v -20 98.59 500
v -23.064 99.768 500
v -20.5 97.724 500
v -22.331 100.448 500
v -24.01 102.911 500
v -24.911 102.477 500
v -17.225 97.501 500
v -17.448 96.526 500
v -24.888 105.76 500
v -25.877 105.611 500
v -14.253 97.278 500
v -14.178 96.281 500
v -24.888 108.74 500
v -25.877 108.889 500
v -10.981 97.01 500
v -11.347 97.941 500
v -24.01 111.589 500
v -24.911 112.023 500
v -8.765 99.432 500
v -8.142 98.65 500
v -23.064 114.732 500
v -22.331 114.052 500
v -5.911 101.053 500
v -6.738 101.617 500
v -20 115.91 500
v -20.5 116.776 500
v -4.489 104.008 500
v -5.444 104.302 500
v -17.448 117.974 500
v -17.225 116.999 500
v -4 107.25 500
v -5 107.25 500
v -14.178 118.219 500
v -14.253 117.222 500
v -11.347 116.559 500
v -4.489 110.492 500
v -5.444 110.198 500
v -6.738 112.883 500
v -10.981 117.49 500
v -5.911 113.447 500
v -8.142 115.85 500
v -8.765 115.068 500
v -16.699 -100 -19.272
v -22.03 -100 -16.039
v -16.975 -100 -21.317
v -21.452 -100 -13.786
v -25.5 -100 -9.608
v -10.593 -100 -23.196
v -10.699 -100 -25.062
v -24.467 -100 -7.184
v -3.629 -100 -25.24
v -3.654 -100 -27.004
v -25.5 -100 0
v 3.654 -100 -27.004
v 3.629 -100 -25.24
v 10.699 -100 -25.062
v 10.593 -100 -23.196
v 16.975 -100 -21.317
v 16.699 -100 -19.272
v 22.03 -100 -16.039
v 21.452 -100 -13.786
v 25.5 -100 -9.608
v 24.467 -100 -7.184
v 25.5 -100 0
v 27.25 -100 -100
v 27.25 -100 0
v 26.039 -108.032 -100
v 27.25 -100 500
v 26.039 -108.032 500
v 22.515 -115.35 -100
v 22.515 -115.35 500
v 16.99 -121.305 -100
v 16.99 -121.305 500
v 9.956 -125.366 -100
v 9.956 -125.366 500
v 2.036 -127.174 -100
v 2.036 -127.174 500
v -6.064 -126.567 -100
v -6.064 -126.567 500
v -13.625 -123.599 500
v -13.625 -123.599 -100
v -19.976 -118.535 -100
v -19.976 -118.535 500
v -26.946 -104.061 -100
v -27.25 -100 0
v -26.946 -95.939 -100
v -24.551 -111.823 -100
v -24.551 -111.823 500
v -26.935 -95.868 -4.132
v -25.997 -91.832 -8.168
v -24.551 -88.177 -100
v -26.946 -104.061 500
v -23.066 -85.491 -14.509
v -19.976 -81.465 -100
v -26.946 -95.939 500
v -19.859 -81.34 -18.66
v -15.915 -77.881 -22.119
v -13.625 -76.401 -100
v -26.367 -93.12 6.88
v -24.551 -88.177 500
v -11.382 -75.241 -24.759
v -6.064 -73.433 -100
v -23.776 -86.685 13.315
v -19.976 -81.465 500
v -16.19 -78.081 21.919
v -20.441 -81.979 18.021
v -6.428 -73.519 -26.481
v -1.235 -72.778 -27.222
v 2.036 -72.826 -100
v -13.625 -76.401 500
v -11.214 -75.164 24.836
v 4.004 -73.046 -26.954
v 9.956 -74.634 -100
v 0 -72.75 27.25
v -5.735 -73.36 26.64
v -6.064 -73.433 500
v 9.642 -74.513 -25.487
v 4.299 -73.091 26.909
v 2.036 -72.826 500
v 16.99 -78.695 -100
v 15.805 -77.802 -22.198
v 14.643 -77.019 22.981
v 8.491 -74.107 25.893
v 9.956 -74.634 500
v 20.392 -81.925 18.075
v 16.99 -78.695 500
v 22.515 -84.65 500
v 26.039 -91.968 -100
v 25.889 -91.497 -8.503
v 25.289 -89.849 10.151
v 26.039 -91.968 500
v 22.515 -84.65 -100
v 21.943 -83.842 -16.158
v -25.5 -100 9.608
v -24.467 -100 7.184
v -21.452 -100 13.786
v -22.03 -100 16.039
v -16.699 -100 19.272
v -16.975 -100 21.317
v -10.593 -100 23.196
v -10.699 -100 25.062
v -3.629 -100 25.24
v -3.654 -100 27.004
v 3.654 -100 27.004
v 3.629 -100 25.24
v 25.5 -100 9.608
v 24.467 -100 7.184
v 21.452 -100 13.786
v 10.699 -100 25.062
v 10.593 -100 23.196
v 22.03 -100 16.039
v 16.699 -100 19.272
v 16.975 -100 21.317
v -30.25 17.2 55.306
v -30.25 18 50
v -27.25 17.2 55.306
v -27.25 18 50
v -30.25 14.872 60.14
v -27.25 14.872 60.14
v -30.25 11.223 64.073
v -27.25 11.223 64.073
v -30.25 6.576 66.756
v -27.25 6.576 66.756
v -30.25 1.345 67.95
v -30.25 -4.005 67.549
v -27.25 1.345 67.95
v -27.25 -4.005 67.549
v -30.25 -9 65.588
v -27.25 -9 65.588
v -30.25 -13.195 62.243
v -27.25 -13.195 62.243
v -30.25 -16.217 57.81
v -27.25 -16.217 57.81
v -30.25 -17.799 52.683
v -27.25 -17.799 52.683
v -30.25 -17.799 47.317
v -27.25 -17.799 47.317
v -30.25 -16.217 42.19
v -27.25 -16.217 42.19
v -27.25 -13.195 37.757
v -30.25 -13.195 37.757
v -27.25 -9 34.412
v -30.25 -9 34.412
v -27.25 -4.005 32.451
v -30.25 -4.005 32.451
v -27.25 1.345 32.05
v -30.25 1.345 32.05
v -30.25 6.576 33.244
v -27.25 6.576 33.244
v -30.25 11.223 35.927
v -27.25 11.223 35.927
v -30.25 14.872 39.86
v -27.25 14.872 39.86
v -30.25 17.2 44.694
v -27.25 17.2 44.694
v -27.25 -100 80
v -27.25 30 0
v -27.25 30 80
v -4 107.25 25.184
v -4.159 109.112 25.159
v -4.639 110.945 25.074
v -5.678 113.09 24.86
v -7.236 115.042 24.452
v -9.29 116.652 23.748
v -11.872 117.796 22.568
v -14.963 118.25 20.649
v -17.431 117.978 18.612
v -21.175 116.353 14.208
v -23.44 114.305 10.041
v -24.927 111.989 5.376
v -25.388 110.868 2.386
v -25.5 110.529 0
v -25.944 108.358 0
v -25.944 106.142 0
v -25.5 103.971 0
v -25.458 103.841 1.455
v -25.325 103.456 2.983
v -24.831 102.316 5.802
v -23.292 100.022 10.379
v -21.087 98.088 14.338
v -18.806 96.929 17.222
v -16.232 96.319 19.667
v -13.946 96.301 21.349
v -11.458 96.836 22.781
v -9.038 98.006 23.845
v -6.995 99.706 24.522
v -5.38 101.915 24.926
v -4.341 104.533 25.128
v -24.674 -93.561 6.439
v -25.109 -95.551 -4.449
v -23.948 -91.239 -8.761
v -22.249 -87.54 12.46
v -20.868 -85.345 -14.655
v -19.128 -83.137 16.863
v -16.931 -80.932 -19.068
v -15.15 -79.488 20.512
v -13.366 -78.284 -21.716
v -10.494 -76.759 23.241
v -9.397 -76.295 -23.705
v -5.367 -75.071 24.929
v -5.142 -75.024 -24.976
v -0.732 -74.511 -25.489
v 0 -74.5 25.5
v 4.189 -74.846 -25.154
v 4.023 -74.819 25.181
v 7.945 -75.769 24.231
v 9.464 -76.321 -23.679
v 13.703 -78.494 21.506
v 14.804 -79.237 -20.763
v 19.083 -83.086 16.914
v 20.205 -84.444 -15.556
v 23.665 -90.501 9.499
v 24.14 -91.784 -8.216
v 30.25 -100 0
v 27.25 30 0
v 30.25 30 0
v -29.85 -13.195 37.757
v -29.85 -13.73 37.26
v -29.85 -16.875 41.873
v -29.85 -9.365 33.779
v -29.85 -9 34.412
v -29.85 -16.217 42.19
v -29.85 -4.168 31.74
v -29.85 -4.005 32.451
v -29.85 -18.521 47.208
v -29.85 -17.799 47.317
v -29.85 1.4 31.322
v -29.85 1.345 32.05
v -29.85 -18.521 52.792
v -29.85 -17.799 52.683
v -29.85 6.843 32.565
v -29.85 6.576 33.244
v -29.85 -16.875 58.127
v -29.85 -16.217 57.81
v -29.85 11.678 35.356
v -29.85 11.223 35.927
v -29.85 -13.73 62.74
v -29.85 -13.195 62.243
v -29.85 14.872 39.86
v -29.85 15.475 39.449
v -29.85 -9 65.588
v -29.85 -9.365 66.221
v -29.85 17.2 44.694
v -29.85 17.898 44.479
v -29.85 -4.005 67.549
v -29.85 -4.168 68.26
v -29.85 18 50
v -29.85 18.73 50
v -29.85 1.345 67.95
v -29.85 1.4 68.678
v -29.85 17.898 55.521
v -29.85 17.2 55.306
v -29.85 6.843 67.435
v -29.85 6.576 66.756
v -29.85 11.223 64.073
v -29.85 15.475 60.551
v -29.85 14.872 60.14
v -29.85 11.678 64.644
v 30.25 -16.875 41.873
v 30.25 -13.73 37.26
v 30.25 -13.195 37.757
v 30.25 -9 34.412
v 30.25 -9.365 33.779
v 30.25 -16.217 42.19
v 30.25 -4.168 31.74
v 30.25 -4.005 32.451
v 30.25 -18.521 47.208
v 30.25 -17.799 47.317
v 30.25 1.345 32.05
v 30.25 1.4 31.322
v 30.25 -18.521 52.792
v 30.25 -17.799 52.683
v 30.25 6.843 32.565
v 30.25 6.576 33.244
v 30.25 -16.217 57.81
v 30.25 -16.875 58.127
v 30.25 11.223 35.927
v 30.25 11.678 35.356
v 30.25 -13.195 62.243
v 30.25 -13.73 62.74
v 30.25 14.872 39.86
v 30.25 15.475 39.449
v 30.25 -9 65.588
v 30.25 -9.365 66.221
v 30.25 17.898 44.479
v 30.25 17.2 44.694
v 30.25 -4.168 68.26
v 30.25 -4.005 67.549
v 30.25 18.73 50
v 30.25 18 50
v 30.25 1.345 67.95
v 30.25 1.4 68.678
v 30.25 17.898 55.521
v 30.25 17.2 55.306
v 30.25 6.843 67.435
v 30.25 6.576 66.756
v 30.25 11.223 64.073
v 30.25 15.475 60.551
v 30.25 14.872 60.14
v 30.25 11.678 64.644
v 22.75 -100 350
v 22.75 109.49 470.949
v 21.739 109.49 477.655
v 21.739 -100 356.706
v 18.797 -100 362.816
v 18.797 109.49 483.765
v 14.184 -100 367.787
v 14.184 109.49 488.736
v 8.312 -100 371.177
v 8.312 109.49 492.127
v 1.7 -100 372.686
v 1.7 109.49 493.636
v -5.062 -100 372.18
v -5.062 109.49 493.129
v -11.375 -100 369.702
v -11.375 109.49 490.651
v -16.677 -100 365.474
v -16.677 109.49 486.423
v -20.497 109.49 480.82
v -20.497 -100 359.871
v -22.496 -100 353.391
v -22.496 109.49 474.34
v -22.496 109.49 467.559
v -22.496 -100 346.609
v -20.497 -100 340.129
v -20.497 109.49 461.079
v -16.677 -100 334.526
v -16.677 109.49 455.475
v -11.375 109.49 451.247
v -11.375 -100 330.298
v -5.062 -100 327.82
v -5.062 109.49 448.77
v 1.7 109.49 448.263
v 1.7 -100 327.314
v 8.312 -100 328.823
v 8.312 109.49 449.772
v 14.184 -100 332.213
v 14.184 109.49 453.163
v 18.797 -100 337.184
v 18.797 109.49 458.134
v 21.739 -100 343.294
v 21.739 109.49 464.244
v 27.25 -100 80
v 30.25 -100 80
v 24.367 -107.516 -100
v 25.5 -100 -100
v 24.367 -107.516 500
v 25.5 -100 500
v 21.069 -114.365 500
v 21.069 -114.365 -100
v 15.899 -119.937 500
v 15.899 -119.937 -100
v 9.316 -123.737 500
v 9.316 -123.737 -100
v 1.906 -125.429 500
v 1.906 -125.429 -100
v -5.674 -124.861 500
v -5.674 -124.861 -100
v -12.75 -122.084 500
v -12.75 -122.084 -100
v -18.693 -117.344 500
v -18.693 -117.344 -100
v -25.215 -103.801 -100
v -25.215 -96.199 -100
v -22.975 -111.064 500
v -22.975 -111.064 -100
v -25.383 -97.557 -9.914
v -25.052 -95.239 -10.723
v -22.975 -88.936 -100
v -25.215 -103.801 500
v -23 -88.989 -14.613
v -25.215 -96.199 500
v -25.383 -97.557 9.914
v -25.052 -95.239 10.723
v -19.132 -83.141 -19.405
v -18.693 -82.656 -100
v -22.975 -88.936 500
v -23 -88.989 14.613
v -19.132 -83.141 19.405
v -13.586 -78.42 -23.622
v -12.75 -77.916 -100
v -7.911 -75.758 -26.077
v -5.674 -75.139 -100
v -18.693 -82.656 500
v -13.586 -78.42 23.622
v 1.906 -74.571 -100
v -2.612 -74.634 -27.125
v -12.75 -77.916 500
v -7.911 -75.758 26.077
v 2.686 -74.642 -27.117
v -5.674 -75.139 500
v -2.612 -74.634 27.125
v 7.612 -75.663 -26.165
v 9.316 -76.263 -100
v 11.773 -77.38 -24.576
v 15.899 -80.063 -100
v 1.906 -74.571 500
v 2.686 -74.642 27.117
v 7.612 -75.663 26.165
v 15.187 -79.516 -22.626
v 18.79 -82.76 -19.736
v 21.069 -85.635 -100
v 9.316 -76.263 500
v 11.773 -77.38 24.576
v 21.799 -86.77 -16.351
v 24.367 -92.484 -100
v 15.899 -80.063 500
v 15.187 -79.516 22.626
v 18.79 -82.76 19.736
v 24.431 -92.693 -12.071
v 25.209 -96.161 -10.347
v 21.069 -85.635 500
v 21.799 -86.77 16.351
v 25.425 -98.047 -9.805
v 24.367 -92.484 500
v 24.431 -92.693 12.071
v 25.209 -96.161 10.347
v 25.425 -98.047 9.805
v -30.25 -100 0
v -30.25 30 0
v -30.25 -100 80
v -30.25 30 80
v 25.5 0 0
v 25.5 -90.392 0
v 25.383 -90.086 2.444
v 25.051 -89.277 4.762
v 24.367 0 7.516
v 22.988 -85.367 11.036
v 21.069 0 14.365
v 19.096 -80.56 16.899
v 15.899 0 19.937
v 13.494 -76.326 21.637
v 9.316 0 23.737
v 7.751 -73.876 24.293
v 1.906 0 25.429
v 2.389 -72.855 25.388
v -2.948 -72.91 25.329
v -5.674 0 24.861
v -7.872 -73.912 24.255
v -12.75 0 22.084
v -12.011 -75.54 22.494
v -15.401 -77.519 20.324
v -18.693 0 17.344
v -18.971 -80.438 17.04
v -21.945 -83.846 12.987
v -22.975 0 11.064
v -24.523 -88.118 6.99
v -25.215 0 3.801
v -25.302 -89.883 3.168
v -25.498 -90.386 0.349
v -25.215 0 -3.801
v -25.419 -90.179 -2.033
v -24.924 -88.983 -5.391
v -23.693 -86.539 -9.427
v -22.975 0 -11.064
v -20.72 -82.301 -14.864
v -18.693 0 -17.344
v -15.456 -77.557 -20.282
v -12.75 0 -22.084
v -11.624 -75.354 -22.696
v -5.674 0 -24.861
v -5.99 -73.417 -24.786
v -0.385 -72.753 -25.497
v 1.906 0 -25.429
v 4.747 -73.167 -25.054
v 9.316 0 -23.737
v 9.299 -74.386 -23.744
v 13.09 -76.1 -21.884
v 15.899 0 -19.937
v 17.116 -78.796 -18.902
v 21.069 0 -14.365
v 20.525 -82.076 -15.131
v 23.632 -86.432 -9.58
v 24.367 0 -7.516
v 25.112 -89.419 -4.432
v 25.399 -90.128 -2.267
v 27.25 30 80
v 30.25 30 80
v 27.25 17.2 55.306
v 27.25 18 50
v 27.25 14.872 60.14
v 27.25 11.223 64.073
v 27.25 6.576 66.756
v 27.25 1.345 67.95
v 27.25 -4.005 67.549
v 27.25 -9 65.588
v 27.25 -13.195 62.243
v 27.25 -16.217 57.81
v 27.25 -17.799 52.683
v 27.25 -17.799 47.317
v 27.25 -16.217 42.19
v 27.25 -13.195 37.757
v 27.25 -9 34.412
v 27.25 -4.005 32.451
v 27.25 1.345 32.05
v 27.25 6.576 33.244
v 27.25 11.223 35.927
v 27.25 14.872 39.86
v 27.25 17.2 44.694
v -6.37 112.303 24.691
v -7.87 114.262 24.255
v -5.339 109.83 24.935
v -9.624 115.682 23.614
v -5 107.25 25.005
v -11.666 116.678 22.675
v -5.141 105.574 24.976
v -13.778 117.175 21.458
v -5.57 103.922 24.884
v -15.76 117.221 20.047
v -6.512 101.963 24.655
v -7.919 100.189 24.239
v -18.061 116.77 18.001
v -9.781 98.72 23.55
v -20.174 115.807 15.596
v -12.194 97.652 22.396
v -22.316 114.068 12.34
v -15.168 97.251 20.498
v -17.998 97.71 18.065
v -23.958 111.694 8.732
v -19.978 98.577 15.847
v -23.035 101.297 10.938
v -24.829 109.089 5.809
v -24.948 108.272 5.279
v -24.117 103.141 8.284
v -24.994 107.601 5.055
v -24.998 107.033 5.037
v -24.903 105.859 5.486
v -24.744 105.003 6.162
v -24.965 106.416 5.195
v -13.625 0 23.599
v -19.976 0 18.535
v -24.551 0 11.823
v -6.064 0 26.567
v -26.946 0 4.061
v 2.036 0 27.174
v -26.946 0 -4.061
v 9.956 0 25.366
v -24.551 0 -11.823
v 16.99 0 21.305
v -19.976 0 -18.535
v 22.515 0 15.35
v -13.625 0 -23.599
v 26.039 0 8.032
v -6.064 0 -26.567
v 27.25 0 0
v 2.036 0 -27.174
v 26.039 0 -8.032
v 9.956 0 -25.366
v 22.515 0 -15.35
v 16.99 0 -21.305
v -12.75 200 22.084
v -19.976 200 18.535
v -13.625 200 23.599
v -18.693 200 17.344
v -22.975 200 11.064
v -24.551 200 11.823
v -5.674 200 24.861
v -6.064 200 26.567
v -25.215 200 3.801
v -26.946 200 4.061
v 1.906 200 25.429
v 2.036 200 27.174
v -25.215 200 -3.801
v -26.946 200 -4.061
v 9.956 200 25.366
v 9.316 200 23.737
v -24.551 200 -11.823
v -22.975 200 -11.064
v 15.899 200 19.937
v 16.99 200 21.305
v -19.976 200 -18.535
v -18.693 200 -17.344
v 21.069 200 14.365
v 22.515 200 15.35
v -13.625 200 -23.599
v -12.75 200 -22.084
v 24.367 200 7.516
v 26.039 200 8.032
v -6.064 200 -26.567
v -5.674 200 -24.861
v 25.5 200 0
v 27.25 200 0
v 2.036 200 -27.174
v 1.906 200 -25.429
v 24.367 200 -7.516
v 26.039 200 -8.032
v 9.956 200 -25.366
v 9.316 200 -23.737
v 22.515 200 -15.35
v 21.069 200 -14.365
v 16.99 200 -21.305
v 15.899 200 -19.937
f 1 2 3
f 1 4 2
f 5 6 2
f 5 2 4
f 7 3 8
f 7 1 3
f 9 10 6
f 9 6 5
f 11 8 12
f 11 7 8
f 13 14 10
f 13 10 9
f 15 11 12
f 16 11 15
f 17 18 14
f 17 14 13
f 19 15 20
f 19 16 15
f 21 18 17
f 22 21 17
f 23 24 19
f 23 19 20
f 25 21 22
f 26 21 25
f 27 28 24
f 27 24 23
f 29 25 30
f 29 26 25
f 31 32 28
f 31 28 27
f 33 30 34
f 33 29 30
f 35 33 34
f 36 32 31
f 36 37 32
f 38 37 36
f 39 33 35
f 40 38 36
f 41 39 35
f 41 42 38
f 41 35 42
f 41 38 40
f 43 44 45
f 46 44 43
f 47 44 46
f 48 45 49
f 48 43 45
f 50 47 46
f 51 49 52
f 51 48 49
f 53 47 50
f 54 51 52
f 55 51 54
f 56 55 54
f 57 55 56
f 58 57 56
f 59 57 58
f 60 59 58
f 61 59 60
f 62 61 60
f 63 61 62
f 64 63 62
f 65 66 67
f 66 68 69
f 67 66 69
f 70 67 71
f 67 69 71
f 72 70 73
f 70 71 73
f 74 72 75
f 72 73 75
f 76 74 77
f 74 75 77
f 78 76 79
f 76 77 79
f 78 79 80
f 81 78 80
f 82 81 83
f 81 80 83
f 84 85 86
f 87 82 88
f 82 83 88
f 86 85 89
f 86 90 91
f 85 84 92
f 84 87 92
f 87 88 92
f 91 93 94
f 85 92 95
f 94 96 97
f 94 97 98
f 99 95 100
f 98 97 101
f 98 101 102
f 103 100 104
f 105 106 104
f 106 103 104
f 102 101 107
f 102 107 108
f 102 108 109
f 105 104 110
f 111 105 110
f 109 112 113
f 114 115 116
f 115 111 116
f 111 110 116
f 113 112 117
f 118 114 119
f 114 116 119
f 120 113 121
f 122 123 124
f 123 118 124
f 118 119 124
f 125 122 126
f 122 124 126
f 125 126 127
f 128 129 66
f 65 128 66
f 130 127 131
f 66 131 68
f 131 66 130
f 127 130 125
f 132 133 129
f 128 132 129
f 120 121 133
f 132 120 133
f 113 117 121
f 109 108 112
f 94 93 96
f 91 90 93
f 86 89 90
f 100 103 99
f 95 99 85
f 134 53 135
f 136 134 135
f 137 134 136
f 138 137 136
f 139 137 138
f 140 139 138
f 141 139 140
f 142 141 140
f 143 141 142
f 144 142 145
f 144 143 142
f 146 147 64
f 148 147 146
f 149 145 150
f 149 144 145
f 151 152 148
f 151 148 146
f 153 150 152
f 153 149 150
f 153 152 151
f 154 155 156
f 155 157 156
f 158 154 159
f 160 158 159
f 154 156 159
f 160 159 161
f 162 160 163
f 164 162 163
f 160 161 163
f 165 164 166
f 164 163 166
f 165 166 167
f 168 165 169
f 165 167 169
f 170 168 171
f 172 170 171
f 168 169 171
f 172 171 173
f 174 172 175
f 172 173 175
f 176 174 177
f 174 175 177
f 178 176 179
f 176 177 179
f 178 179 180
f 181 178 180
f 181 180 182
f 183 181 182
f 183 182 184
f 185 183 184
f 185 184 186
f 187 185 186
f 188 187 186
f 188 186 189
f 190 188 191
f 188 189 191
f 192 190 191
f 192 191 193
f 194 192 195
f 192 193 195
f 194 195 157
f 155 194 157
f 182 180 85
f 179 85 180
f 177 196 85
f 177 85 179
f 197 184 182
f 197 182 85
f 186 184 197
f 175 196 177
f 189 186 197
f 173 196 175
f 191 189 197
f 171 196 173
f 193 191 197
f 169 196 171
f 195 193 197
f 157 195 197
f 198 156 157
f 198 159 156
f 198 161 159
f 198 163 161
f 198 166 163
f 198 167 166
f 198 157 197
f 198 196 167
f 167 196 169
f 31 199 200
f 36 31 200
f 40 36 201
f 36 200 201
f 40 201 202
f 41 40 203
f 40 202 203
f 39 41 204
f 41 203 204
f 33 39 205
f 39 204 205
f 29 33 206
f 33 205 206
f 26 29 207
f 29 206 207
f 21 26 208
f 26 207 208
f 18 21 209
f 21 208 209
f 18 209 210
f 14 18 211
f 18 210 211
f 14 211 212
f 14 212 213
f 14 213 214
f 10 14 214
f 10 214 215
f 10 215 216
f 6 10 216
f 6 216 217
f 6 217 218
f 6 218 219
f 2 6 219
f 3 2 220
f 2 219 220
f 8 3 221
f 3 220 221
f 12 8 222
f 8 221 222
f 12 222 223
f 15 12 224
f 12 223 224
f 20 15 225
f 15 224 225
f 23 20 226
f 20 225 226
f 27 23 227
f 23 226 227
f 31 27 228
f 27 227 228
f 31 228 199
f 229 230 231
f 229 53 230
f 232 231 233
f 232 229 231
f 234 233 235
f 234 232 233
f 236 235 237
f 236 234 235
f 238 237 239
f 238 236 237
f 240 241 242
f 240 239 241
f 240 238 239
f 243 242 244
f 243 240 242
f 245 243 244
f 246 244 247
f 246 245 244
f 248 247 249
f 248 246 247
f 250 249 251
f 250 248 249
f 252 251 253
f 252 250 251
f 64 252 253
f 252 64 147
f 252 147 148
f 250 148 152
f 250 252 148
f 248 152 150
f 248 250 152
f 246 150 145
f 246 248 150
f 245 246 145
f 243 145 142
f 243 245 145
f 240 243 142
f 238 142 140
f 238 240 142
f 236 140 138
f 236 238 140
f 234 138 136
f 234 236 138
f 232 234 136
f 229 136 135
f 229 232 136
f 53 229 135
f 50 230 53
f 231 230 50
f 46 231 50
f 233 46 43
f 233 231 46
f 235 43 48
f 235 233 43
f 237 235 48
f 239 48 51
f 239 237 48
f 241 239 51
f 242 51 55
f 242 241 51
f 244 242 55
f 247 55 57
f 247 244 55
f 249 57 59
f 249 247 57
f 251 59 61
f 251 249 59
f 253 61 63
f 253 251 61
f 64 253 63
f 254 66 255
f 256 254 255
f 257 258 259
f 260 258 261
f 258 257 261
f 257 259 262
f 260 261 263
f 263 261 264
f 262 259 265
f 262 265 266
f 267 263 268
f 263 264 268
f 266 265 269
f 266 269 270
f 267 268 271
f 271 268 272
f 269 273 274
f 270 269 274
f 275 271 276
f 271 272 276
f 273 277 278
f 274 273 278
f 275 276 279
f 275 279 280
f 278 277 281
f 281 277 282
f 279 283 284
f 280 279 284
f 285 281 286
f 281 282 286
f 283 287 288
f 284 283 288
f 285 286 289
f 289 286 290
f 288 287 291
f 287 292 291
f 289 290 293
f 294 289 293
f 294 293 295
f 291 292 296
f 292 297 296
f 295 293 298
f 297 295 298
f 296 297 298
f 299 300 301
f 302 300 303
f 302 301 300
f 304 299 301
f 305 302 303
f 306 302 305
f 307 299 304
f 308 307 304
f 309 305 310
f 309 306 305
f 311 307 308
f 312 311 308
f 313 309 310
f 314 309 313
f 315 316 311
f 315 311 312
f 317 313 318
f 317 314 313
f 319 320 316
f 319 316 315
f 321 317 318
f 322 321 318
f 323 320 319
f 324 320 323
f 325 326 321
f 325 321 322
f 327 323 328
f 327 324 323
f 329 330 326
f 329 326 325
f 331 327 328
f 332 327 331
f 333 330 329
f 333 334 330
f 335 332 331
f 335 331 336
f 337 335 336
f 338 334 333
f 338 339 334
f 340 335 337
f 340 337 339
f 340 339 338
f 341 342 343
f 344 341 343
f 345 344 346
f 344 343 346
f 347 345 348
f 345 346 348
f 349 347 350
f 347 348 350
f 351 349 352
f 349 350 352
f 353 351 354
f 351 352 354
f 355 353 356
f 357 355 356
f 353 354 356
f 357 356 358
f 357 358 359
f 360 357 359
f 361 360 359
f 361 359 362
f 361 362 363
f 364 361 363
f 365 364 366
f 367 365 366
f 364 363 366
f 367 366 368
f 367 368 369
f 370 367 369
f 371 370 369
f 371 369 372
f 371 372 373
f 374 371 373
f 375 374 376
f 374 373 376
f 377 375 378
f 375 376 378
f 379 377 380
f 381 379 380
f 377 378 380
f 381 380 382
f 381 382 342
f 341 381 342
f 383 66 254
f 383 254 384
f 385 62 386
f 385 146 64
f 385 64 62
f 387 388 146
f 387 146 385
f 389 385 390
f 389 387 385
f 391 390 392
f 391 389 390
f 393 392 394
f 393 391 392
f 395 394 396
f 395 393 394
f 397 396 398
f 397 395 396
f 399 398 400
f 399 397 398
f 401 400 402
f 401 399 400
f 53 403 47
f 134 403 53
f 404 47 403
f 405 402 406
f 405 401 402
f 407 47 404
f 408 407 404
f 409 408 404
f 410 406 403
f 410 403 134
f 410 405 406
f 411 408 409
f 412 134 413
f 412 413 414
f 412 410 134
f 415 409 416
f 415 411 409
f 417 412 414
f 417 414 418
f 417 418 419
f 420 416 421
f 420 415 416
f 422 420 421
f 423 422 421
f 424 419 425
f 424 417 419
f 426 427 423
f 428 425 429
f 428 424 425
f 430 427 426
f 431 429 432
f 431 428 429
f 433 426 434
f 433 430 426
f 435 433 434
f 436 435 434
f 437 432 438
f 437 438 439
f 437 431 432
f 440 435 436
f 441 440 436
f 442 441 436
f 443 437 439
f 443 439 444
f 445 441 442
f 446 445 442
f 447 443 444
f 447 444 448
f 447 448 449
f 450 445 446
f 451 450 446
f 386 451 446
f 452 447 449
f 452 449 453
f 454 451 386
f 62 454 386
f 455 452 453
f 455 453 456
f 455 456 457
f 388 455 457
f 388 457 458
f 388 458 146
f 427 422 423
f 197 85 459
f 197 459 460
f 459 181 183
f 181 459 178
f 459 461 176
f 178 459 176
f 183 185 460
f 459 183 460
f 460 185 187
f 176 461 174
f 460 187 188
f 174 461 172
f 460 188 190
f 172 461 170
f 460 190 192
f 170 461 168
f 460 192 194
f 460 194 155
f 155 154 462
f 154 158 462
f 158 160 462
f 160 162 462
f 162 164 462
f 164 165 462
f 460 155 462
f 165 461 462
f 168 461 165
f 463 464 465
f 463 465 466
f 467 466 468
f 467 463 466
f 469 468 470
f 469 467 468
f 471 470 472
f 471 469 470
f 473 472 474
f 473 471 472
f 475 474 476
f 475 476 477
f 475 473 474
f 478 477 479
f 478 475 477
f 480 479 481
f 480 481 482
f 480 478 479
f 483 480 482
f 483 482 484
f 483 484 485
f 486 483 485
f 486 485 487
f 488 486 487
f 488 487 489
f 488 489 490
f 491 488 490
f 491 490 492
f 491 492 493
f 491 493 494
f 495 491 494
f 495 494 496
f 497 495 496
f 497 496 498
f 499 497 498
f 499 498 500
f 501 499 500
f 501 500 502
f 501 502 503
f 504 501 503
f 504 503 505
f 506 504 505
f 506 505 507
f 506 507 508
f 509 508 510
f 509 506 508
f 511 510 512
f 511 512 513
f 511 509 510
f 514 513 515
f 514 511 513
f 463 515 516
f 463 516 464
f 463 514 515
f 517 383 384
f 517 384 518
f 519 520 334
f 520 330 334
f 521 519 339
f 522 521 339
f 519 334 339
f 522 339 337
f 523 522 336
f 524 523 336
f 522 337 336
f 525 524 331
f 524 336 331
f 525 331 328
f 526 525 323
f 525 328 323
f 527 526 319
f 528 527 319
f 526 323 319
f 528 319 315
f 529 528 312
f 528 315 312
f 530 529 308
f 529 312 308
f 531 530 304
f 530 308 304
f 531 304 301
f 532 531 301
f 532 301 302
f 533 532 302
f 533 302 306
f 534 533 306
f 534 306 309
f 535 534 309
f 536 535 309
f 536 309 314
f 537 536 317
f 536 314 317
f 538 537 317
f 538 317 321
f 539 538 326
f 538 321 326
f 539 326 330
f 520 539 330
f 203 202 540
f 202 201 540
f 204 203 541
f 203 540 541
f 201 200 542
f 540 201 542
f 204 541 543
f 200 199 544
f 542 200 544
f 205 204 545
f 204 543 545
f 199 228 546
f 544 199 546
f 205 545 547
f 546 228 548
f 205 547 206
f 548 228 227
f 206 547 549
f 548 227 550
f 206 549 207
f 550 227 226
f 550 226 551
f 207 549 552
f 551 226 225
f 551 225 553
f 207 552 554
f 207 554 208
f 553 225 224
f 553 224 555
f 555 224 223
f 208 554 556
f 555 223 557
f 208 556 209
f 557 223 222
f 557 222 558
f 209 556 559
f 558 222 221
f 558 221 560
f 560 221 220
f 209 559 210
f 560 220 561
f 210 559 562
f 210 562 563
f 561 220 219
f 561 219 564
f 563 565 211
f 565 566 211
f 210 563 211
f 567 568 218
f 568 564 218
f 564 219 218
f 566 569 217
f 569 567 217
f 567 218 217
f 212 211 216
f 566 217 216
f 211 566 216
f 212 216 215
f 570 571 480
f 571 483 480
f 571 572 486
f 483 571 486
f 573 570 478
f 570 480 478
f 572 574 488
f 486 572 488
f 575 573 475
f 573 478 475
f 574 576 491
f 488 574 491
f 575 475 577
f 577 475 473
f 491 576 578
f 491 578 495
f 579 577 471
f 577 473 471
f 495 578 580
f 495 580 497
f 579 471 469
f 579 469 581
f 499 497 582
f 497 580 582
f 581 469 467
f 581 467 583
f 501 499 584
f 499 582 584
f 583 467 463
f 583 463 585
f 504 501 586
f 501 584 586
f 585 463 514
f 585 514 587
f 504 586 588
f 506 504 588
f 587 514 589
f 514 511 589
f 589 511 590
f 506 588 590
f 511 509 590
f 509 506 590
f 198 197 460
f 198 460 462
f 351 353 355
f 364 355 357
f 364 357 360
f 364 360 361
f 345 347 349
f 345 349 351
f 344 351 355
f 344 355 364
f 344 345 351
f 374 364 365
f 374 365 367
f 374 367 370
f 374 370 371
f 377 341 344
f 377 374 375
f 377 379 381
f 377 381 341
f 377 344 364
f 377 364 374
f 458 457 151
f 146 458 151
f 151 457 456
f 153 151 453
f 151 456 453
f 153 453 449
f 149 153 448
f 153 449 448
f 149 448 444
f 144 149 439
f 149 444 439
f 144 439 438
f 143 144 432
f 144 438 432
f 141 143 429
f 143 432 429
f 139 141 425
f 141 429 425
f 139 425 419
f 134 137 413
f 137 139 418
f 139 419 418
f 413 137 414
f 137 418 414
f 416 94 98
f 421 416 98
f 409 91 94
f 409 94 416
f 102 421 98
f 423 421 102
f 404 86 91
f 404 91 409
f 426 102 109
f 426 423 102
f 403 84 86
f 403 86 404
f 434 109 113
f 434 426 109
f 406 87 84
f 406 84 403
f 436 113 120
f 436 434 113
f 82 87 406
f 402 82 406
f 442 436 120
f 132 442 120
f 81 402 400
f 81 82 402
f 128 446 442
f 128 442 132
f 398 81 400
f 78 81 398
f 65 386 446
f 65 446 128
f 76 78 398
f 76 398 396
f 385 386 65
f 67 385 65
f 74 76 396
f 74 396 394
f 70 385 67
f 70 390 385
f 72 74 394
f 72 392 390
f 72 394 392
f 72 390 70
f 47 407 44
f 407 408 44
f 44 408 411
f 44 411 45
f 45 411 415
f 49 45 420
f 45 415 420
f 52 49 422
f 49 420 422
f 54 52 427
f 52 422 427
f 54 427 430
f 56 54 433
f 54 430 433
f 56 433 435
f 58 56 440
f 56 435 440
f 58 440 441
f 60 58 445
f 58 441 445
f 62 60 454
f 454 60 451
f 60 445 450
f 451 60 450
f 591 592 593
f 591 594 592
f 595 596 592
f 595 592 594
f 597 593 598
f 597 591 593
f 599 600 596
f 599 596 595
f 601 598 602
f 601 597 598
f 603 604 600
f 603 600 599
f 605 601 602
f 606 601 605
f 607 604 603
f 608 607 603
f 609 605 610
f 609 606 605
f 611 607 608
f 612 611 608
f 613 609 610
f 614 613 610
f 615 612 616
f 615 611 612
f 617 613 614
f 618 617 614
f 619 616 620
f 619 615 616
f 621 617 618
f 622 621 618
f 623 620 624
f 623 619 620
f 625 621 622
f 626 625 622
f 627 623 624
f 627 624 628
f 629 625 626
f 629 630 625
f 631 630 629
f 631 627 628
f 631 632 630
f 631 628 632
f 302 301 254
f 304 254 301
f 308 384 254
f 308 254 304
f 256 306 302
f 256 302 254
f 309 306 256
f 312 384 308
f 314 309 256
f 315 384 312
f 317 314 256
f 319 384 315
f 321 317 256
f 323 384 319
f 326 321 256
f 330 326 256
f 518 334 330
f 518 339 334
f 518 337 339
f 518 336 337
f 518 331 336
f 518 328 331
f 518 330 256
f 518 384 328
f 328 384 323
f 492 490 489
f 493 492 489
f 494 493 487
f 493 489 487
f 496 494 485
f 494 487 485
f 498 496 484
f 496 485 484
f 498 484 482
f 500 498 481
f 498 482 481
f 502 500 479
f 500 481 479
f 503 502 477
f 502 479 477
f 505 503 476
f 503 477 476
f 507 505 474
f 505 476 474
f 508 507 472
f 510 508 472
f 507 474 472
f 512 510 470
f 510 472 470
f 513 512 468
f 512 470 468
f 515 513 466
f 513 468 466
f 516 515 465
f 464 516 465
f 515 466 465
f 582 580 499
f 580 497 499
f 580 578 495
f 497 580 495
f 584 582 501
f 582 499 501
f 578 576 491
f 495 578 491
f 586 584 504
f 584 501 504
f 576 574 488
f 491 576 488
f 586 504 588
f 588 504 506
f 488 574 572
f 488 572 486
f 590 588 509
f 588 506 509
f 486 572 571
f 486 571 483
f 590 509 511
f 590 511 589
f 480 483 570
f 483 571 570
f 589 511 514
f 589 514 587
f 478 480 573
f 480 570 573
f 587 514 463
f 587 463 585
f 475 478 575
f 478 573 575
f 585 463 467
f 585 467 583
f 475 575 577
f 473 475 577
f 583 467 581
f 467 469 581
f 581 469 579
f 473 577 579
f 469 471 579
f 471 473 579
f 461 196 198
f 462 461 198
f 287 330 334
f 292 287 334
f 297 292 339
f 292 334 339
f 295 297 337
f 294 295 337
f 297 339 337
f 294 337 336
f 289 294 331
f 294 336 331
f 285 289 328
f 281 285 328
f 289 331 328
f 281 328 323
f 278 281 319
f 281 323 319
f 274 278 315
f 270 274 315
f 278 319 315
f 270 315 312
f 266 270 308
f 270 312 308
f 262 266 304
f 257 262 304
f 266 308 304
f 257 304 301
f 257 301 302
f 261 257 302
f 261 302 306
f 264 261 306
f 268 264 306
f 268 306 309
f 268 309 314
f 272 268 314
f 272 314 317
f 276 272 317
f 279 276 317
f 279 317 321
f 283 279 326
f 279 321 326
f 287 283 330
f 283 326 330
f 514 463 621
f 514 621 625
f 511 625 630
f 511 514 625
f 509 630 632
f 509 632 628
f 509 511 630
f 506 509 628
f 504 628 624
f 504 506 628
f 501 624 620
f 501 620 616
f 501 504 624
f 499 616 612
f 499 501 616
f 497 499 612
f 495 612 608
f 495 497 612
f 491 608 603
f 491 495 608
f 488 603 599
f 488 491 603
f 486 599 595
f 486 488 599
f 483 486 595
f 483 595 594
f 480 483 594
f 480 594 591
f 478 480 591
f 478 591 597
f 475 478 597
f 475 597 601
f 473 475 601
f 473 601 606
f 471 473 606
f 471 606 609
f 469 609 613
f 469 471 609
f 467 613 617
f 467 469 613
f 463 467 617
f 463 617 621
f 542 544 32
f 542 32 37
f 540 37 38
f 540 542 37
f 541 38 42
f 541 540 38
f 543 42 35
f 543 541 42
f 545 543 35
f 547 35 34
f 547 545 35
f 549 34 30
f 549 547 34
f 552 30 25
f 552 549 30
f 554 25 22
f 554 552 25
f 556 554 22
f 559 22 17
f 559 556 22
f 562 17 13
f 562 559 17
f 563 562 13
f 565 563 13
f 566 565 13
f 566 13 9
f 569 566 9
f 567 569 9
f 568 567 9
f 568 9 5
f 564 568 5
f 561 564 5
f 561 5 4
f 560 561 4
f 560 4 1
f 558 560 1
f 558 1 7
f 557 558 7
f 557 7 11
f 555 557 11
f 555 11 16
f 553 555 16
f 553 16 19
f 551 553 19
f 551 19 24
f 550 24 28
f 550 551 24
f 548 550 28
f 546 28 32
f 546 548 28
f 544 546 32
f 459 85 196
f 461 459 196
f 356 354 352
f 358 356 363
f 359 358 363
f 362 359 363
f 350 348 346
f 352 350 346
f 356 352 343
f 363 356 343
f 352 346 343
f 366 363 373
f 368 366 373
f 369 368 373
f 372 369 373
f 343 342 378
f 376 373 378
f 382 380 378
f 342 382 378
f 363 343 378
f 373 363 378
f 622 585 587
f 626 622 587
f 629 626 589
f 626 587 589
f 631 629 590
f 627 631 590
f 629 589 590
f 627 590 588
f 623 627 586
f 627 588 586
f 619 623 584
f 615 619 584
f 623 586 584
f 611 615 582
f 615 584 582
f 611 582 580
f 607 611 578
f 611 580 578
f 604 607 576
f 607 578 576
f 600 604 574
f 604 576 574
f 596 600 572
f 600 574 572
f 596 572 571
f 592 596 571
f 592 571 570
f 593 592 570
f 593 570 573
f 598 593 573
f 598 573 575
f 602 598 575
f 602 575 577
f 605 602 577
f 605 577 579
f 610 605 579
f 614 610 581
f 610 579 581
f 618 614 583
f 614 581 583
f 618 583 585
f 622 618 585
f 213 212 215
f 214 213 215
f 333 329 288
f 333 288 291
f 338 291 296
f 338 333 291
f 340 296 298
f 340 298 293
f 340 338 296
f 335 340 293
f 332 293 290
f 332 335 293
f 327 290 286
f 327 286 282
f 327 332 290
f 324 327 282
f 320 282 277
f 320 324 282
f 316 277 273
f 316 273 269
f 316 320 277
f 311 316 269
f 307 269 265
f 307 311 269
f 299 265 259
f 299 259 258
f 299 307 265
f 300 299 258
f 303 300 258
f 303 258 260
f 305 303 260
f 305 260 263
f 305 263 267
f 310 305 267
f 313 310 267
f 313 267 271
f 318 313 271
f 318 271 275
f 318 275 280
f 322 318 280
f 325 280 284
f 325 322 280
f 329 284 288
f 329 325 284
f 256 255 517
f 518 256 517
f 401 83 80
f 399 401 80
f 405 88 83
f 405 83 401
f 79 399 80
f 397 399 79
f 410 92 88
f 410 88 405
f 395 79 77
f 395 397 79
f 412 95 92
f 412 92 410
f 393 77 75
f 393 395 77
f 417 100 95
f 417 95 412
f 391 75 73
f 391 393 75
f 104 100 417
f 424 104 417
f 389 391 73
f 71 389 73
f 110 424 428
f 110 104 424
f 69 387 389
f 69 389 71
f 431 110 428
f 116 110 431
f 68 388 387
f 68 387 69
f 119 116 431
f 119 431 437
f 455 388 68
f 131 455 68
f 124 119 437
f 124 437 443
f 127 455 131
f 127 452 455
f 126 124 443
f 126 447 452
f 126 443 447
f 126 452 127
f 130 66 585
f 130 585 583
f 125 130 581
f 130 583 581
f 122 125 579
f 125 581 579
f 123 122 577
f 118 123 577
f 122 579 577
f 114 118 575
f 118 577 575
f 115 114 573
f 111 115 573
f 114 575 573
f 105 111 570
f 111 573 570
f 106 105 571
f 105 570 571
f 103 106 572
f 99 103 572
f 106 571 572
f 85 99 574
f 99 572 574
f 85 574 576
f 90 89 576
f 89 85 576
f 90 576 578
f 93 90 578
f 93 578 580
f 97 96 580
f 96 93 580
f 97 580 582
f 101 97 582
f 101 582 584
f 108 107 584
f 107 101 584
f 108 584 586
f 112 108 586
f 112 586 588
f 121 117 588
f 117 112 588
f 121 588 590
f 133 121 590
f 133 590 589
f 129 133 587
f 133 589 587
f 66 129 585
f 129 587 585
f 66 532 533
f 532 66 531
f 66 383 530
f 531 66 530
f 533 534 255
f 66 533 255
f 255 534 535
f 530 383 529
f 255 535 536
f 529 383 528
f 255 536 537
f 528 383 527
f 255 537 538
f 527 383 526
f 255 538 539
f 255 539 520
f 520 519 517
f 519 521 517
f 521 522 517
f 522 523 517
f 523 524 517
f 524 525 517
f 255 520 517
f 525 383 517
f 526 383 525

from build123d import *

# Parameters (mm, degrees)
F0_R        = 27.25
F0_R_2      = 25.5
F0_R_3      = 11
F0_R_4      = 10
F1_DEPTH    = 500
F1_FACE_R   = 27.25
F1_FACE_R_2 = 25.5
F2_DEPTH    = 100
F3_R        = 27.25
F3_R_2      = 25.5
F4_DEPTH    = 100
F4_FACE_R   = 27.25
F4_FACE_R_2 = 25.5
F5_DEPTH    = 200
F6_DEPTH    = 200
F9_W        = 130
F9_H        = 80
F10_DEPTH   = 3
F12_R       = 18.73
F12_R_2     = 18
F13_DEPTH   = 60.1
F14_DEPTH   = 88
F18_R       = 22.75


with BuildPart() as f1:
    # F0 (on Top) → F1 (new body)
    with BuildSketch(Plane.XY):
        with Locations((0, -100)):
            Circle(F0_R)
        with Locations((0, -100)):
            Circle(F0_R_2, mode=Mode.SUBTRACT)
        with Locations((-15, 107.25)):
            Circle(F0_R_3)
        with Locations((-15, 107.25)):
            Circle(F0_R_4, mode=Mode.SUBTRACT)
    extrude(amount=F1_DEPTH)



with BuildPart() as f2:
    # F1_face (on face) → F2 (new body)
    with BuildSketch(Plane(origin=(0, -100, 0), x_dir=(1, 0, 0), z_dir=(0, 0, -1))):
        Circle(F1_FACE_R)
        Circle(F1_FACE_R_2, mode=Mode.SUBTRACT)
    extrude(amount=F2_DEPTH)


with BuildPart() as f1_1:
    add(f1.part)

    add(f2.part)  # F4 merges F2
    # F3 (on Front) → F4 (join)
    with BuildSketch(Plane.XZ):
        Circle(F3_R)
        Circle(F3_R_2, mode=Mode.SUBTRACT)
    extrude(amount=F4_DEPTH)


with BuildPart() as f5:
    # F4_face (on face) → F5 (new body)
    with BuildSketch(Plane(origin=(0, 0, 0), x_dir=(1, 0, 0), z_dir=(0, 1, 0))):
        Circle(F4_FACE_R)
        Circle(F4_FACE_R_2, mode=Mode.SUBTRACT)
    extrude(amount=F5_DEPTH)


with BuildPart() as f6:
    # F3 (on Front) → F6 (new body)
    with BuildSketch(Plane.XZ):
        Circle(F3_R_2)
    extrude(amount=-F6_DEPTH)


with BuildPart() as f1_2:
    add(f1_1.part)

    # F7: cut F6
    add(f6.part, mode=Mode.SUBTRACT)


with BuildPart() as f10:
    # F9 (on offset) → F10 (new body)
    with BuildSketch(Plane.YZ.offset(27.25)):
        with Locations((-35, 40)):
            Rectangle(F9_W, F9_H)
    extrude(amount=F10_DEPTH)


with BuildPart() as f11_1:
    # F11: instance of F10
    add(f10.part.mirror(Plane.YZ))


with BuildPart() as f13:
    # F12 (on face) → F13 (new body)
    with BuildSketch(Plane.YZ.offset(30.25)):
        with Locations((0, 50)):
            Circle(F12_R)
        with Locations((0, 50)):
            Circle(F12_R_2, mode=Mode.SUBTRACT)
    extrude(amount=-F13_DEPTH)


with BuildPart() as f14:
    # F12 (on face) → F14 (new body, symmetric)
    with BuildSketch(Plane.YZ.offset(30.25)):
        with Locations((0, 50)):
            Circle(F12_R_2)
    extrude(amount=F14_DEPTH, both=True)


with BuildPart() as f10_1:
    add(f10.part)

    # F15: cut F14
    add(f14.part, mode=Mode.SUBTRACT)


with BuildPart() as f11_1_1:
    add(f11_1.part)

    # F15: cut F14
    add(f14.part, mode=Mode.SUBTRACT)


with BuildPart() as f13_1:
    add(f13.part)

    # F15: cut F14
    add(f14.part, mode=Mode.SUBTRACT)


with BuildPart() as f19:
    # F19: sweep along a path in F16
    with BuildLine(Plane.YZ) as f19_path:
        Line((-100, 350), (109.490453, 470.94937))
    # F18 (on offset) → F19 (sweep)
    with BuildSketch(Plane.XZ.offset(100)):
        with Locations((0, 350)):
            Circle(F18_R)
    sweep(path=f19_path.line)


solid = Compound([f5.part, f1_2.part, f10_1.part, f11_1_1.part, f13_1.part, f19.part])
